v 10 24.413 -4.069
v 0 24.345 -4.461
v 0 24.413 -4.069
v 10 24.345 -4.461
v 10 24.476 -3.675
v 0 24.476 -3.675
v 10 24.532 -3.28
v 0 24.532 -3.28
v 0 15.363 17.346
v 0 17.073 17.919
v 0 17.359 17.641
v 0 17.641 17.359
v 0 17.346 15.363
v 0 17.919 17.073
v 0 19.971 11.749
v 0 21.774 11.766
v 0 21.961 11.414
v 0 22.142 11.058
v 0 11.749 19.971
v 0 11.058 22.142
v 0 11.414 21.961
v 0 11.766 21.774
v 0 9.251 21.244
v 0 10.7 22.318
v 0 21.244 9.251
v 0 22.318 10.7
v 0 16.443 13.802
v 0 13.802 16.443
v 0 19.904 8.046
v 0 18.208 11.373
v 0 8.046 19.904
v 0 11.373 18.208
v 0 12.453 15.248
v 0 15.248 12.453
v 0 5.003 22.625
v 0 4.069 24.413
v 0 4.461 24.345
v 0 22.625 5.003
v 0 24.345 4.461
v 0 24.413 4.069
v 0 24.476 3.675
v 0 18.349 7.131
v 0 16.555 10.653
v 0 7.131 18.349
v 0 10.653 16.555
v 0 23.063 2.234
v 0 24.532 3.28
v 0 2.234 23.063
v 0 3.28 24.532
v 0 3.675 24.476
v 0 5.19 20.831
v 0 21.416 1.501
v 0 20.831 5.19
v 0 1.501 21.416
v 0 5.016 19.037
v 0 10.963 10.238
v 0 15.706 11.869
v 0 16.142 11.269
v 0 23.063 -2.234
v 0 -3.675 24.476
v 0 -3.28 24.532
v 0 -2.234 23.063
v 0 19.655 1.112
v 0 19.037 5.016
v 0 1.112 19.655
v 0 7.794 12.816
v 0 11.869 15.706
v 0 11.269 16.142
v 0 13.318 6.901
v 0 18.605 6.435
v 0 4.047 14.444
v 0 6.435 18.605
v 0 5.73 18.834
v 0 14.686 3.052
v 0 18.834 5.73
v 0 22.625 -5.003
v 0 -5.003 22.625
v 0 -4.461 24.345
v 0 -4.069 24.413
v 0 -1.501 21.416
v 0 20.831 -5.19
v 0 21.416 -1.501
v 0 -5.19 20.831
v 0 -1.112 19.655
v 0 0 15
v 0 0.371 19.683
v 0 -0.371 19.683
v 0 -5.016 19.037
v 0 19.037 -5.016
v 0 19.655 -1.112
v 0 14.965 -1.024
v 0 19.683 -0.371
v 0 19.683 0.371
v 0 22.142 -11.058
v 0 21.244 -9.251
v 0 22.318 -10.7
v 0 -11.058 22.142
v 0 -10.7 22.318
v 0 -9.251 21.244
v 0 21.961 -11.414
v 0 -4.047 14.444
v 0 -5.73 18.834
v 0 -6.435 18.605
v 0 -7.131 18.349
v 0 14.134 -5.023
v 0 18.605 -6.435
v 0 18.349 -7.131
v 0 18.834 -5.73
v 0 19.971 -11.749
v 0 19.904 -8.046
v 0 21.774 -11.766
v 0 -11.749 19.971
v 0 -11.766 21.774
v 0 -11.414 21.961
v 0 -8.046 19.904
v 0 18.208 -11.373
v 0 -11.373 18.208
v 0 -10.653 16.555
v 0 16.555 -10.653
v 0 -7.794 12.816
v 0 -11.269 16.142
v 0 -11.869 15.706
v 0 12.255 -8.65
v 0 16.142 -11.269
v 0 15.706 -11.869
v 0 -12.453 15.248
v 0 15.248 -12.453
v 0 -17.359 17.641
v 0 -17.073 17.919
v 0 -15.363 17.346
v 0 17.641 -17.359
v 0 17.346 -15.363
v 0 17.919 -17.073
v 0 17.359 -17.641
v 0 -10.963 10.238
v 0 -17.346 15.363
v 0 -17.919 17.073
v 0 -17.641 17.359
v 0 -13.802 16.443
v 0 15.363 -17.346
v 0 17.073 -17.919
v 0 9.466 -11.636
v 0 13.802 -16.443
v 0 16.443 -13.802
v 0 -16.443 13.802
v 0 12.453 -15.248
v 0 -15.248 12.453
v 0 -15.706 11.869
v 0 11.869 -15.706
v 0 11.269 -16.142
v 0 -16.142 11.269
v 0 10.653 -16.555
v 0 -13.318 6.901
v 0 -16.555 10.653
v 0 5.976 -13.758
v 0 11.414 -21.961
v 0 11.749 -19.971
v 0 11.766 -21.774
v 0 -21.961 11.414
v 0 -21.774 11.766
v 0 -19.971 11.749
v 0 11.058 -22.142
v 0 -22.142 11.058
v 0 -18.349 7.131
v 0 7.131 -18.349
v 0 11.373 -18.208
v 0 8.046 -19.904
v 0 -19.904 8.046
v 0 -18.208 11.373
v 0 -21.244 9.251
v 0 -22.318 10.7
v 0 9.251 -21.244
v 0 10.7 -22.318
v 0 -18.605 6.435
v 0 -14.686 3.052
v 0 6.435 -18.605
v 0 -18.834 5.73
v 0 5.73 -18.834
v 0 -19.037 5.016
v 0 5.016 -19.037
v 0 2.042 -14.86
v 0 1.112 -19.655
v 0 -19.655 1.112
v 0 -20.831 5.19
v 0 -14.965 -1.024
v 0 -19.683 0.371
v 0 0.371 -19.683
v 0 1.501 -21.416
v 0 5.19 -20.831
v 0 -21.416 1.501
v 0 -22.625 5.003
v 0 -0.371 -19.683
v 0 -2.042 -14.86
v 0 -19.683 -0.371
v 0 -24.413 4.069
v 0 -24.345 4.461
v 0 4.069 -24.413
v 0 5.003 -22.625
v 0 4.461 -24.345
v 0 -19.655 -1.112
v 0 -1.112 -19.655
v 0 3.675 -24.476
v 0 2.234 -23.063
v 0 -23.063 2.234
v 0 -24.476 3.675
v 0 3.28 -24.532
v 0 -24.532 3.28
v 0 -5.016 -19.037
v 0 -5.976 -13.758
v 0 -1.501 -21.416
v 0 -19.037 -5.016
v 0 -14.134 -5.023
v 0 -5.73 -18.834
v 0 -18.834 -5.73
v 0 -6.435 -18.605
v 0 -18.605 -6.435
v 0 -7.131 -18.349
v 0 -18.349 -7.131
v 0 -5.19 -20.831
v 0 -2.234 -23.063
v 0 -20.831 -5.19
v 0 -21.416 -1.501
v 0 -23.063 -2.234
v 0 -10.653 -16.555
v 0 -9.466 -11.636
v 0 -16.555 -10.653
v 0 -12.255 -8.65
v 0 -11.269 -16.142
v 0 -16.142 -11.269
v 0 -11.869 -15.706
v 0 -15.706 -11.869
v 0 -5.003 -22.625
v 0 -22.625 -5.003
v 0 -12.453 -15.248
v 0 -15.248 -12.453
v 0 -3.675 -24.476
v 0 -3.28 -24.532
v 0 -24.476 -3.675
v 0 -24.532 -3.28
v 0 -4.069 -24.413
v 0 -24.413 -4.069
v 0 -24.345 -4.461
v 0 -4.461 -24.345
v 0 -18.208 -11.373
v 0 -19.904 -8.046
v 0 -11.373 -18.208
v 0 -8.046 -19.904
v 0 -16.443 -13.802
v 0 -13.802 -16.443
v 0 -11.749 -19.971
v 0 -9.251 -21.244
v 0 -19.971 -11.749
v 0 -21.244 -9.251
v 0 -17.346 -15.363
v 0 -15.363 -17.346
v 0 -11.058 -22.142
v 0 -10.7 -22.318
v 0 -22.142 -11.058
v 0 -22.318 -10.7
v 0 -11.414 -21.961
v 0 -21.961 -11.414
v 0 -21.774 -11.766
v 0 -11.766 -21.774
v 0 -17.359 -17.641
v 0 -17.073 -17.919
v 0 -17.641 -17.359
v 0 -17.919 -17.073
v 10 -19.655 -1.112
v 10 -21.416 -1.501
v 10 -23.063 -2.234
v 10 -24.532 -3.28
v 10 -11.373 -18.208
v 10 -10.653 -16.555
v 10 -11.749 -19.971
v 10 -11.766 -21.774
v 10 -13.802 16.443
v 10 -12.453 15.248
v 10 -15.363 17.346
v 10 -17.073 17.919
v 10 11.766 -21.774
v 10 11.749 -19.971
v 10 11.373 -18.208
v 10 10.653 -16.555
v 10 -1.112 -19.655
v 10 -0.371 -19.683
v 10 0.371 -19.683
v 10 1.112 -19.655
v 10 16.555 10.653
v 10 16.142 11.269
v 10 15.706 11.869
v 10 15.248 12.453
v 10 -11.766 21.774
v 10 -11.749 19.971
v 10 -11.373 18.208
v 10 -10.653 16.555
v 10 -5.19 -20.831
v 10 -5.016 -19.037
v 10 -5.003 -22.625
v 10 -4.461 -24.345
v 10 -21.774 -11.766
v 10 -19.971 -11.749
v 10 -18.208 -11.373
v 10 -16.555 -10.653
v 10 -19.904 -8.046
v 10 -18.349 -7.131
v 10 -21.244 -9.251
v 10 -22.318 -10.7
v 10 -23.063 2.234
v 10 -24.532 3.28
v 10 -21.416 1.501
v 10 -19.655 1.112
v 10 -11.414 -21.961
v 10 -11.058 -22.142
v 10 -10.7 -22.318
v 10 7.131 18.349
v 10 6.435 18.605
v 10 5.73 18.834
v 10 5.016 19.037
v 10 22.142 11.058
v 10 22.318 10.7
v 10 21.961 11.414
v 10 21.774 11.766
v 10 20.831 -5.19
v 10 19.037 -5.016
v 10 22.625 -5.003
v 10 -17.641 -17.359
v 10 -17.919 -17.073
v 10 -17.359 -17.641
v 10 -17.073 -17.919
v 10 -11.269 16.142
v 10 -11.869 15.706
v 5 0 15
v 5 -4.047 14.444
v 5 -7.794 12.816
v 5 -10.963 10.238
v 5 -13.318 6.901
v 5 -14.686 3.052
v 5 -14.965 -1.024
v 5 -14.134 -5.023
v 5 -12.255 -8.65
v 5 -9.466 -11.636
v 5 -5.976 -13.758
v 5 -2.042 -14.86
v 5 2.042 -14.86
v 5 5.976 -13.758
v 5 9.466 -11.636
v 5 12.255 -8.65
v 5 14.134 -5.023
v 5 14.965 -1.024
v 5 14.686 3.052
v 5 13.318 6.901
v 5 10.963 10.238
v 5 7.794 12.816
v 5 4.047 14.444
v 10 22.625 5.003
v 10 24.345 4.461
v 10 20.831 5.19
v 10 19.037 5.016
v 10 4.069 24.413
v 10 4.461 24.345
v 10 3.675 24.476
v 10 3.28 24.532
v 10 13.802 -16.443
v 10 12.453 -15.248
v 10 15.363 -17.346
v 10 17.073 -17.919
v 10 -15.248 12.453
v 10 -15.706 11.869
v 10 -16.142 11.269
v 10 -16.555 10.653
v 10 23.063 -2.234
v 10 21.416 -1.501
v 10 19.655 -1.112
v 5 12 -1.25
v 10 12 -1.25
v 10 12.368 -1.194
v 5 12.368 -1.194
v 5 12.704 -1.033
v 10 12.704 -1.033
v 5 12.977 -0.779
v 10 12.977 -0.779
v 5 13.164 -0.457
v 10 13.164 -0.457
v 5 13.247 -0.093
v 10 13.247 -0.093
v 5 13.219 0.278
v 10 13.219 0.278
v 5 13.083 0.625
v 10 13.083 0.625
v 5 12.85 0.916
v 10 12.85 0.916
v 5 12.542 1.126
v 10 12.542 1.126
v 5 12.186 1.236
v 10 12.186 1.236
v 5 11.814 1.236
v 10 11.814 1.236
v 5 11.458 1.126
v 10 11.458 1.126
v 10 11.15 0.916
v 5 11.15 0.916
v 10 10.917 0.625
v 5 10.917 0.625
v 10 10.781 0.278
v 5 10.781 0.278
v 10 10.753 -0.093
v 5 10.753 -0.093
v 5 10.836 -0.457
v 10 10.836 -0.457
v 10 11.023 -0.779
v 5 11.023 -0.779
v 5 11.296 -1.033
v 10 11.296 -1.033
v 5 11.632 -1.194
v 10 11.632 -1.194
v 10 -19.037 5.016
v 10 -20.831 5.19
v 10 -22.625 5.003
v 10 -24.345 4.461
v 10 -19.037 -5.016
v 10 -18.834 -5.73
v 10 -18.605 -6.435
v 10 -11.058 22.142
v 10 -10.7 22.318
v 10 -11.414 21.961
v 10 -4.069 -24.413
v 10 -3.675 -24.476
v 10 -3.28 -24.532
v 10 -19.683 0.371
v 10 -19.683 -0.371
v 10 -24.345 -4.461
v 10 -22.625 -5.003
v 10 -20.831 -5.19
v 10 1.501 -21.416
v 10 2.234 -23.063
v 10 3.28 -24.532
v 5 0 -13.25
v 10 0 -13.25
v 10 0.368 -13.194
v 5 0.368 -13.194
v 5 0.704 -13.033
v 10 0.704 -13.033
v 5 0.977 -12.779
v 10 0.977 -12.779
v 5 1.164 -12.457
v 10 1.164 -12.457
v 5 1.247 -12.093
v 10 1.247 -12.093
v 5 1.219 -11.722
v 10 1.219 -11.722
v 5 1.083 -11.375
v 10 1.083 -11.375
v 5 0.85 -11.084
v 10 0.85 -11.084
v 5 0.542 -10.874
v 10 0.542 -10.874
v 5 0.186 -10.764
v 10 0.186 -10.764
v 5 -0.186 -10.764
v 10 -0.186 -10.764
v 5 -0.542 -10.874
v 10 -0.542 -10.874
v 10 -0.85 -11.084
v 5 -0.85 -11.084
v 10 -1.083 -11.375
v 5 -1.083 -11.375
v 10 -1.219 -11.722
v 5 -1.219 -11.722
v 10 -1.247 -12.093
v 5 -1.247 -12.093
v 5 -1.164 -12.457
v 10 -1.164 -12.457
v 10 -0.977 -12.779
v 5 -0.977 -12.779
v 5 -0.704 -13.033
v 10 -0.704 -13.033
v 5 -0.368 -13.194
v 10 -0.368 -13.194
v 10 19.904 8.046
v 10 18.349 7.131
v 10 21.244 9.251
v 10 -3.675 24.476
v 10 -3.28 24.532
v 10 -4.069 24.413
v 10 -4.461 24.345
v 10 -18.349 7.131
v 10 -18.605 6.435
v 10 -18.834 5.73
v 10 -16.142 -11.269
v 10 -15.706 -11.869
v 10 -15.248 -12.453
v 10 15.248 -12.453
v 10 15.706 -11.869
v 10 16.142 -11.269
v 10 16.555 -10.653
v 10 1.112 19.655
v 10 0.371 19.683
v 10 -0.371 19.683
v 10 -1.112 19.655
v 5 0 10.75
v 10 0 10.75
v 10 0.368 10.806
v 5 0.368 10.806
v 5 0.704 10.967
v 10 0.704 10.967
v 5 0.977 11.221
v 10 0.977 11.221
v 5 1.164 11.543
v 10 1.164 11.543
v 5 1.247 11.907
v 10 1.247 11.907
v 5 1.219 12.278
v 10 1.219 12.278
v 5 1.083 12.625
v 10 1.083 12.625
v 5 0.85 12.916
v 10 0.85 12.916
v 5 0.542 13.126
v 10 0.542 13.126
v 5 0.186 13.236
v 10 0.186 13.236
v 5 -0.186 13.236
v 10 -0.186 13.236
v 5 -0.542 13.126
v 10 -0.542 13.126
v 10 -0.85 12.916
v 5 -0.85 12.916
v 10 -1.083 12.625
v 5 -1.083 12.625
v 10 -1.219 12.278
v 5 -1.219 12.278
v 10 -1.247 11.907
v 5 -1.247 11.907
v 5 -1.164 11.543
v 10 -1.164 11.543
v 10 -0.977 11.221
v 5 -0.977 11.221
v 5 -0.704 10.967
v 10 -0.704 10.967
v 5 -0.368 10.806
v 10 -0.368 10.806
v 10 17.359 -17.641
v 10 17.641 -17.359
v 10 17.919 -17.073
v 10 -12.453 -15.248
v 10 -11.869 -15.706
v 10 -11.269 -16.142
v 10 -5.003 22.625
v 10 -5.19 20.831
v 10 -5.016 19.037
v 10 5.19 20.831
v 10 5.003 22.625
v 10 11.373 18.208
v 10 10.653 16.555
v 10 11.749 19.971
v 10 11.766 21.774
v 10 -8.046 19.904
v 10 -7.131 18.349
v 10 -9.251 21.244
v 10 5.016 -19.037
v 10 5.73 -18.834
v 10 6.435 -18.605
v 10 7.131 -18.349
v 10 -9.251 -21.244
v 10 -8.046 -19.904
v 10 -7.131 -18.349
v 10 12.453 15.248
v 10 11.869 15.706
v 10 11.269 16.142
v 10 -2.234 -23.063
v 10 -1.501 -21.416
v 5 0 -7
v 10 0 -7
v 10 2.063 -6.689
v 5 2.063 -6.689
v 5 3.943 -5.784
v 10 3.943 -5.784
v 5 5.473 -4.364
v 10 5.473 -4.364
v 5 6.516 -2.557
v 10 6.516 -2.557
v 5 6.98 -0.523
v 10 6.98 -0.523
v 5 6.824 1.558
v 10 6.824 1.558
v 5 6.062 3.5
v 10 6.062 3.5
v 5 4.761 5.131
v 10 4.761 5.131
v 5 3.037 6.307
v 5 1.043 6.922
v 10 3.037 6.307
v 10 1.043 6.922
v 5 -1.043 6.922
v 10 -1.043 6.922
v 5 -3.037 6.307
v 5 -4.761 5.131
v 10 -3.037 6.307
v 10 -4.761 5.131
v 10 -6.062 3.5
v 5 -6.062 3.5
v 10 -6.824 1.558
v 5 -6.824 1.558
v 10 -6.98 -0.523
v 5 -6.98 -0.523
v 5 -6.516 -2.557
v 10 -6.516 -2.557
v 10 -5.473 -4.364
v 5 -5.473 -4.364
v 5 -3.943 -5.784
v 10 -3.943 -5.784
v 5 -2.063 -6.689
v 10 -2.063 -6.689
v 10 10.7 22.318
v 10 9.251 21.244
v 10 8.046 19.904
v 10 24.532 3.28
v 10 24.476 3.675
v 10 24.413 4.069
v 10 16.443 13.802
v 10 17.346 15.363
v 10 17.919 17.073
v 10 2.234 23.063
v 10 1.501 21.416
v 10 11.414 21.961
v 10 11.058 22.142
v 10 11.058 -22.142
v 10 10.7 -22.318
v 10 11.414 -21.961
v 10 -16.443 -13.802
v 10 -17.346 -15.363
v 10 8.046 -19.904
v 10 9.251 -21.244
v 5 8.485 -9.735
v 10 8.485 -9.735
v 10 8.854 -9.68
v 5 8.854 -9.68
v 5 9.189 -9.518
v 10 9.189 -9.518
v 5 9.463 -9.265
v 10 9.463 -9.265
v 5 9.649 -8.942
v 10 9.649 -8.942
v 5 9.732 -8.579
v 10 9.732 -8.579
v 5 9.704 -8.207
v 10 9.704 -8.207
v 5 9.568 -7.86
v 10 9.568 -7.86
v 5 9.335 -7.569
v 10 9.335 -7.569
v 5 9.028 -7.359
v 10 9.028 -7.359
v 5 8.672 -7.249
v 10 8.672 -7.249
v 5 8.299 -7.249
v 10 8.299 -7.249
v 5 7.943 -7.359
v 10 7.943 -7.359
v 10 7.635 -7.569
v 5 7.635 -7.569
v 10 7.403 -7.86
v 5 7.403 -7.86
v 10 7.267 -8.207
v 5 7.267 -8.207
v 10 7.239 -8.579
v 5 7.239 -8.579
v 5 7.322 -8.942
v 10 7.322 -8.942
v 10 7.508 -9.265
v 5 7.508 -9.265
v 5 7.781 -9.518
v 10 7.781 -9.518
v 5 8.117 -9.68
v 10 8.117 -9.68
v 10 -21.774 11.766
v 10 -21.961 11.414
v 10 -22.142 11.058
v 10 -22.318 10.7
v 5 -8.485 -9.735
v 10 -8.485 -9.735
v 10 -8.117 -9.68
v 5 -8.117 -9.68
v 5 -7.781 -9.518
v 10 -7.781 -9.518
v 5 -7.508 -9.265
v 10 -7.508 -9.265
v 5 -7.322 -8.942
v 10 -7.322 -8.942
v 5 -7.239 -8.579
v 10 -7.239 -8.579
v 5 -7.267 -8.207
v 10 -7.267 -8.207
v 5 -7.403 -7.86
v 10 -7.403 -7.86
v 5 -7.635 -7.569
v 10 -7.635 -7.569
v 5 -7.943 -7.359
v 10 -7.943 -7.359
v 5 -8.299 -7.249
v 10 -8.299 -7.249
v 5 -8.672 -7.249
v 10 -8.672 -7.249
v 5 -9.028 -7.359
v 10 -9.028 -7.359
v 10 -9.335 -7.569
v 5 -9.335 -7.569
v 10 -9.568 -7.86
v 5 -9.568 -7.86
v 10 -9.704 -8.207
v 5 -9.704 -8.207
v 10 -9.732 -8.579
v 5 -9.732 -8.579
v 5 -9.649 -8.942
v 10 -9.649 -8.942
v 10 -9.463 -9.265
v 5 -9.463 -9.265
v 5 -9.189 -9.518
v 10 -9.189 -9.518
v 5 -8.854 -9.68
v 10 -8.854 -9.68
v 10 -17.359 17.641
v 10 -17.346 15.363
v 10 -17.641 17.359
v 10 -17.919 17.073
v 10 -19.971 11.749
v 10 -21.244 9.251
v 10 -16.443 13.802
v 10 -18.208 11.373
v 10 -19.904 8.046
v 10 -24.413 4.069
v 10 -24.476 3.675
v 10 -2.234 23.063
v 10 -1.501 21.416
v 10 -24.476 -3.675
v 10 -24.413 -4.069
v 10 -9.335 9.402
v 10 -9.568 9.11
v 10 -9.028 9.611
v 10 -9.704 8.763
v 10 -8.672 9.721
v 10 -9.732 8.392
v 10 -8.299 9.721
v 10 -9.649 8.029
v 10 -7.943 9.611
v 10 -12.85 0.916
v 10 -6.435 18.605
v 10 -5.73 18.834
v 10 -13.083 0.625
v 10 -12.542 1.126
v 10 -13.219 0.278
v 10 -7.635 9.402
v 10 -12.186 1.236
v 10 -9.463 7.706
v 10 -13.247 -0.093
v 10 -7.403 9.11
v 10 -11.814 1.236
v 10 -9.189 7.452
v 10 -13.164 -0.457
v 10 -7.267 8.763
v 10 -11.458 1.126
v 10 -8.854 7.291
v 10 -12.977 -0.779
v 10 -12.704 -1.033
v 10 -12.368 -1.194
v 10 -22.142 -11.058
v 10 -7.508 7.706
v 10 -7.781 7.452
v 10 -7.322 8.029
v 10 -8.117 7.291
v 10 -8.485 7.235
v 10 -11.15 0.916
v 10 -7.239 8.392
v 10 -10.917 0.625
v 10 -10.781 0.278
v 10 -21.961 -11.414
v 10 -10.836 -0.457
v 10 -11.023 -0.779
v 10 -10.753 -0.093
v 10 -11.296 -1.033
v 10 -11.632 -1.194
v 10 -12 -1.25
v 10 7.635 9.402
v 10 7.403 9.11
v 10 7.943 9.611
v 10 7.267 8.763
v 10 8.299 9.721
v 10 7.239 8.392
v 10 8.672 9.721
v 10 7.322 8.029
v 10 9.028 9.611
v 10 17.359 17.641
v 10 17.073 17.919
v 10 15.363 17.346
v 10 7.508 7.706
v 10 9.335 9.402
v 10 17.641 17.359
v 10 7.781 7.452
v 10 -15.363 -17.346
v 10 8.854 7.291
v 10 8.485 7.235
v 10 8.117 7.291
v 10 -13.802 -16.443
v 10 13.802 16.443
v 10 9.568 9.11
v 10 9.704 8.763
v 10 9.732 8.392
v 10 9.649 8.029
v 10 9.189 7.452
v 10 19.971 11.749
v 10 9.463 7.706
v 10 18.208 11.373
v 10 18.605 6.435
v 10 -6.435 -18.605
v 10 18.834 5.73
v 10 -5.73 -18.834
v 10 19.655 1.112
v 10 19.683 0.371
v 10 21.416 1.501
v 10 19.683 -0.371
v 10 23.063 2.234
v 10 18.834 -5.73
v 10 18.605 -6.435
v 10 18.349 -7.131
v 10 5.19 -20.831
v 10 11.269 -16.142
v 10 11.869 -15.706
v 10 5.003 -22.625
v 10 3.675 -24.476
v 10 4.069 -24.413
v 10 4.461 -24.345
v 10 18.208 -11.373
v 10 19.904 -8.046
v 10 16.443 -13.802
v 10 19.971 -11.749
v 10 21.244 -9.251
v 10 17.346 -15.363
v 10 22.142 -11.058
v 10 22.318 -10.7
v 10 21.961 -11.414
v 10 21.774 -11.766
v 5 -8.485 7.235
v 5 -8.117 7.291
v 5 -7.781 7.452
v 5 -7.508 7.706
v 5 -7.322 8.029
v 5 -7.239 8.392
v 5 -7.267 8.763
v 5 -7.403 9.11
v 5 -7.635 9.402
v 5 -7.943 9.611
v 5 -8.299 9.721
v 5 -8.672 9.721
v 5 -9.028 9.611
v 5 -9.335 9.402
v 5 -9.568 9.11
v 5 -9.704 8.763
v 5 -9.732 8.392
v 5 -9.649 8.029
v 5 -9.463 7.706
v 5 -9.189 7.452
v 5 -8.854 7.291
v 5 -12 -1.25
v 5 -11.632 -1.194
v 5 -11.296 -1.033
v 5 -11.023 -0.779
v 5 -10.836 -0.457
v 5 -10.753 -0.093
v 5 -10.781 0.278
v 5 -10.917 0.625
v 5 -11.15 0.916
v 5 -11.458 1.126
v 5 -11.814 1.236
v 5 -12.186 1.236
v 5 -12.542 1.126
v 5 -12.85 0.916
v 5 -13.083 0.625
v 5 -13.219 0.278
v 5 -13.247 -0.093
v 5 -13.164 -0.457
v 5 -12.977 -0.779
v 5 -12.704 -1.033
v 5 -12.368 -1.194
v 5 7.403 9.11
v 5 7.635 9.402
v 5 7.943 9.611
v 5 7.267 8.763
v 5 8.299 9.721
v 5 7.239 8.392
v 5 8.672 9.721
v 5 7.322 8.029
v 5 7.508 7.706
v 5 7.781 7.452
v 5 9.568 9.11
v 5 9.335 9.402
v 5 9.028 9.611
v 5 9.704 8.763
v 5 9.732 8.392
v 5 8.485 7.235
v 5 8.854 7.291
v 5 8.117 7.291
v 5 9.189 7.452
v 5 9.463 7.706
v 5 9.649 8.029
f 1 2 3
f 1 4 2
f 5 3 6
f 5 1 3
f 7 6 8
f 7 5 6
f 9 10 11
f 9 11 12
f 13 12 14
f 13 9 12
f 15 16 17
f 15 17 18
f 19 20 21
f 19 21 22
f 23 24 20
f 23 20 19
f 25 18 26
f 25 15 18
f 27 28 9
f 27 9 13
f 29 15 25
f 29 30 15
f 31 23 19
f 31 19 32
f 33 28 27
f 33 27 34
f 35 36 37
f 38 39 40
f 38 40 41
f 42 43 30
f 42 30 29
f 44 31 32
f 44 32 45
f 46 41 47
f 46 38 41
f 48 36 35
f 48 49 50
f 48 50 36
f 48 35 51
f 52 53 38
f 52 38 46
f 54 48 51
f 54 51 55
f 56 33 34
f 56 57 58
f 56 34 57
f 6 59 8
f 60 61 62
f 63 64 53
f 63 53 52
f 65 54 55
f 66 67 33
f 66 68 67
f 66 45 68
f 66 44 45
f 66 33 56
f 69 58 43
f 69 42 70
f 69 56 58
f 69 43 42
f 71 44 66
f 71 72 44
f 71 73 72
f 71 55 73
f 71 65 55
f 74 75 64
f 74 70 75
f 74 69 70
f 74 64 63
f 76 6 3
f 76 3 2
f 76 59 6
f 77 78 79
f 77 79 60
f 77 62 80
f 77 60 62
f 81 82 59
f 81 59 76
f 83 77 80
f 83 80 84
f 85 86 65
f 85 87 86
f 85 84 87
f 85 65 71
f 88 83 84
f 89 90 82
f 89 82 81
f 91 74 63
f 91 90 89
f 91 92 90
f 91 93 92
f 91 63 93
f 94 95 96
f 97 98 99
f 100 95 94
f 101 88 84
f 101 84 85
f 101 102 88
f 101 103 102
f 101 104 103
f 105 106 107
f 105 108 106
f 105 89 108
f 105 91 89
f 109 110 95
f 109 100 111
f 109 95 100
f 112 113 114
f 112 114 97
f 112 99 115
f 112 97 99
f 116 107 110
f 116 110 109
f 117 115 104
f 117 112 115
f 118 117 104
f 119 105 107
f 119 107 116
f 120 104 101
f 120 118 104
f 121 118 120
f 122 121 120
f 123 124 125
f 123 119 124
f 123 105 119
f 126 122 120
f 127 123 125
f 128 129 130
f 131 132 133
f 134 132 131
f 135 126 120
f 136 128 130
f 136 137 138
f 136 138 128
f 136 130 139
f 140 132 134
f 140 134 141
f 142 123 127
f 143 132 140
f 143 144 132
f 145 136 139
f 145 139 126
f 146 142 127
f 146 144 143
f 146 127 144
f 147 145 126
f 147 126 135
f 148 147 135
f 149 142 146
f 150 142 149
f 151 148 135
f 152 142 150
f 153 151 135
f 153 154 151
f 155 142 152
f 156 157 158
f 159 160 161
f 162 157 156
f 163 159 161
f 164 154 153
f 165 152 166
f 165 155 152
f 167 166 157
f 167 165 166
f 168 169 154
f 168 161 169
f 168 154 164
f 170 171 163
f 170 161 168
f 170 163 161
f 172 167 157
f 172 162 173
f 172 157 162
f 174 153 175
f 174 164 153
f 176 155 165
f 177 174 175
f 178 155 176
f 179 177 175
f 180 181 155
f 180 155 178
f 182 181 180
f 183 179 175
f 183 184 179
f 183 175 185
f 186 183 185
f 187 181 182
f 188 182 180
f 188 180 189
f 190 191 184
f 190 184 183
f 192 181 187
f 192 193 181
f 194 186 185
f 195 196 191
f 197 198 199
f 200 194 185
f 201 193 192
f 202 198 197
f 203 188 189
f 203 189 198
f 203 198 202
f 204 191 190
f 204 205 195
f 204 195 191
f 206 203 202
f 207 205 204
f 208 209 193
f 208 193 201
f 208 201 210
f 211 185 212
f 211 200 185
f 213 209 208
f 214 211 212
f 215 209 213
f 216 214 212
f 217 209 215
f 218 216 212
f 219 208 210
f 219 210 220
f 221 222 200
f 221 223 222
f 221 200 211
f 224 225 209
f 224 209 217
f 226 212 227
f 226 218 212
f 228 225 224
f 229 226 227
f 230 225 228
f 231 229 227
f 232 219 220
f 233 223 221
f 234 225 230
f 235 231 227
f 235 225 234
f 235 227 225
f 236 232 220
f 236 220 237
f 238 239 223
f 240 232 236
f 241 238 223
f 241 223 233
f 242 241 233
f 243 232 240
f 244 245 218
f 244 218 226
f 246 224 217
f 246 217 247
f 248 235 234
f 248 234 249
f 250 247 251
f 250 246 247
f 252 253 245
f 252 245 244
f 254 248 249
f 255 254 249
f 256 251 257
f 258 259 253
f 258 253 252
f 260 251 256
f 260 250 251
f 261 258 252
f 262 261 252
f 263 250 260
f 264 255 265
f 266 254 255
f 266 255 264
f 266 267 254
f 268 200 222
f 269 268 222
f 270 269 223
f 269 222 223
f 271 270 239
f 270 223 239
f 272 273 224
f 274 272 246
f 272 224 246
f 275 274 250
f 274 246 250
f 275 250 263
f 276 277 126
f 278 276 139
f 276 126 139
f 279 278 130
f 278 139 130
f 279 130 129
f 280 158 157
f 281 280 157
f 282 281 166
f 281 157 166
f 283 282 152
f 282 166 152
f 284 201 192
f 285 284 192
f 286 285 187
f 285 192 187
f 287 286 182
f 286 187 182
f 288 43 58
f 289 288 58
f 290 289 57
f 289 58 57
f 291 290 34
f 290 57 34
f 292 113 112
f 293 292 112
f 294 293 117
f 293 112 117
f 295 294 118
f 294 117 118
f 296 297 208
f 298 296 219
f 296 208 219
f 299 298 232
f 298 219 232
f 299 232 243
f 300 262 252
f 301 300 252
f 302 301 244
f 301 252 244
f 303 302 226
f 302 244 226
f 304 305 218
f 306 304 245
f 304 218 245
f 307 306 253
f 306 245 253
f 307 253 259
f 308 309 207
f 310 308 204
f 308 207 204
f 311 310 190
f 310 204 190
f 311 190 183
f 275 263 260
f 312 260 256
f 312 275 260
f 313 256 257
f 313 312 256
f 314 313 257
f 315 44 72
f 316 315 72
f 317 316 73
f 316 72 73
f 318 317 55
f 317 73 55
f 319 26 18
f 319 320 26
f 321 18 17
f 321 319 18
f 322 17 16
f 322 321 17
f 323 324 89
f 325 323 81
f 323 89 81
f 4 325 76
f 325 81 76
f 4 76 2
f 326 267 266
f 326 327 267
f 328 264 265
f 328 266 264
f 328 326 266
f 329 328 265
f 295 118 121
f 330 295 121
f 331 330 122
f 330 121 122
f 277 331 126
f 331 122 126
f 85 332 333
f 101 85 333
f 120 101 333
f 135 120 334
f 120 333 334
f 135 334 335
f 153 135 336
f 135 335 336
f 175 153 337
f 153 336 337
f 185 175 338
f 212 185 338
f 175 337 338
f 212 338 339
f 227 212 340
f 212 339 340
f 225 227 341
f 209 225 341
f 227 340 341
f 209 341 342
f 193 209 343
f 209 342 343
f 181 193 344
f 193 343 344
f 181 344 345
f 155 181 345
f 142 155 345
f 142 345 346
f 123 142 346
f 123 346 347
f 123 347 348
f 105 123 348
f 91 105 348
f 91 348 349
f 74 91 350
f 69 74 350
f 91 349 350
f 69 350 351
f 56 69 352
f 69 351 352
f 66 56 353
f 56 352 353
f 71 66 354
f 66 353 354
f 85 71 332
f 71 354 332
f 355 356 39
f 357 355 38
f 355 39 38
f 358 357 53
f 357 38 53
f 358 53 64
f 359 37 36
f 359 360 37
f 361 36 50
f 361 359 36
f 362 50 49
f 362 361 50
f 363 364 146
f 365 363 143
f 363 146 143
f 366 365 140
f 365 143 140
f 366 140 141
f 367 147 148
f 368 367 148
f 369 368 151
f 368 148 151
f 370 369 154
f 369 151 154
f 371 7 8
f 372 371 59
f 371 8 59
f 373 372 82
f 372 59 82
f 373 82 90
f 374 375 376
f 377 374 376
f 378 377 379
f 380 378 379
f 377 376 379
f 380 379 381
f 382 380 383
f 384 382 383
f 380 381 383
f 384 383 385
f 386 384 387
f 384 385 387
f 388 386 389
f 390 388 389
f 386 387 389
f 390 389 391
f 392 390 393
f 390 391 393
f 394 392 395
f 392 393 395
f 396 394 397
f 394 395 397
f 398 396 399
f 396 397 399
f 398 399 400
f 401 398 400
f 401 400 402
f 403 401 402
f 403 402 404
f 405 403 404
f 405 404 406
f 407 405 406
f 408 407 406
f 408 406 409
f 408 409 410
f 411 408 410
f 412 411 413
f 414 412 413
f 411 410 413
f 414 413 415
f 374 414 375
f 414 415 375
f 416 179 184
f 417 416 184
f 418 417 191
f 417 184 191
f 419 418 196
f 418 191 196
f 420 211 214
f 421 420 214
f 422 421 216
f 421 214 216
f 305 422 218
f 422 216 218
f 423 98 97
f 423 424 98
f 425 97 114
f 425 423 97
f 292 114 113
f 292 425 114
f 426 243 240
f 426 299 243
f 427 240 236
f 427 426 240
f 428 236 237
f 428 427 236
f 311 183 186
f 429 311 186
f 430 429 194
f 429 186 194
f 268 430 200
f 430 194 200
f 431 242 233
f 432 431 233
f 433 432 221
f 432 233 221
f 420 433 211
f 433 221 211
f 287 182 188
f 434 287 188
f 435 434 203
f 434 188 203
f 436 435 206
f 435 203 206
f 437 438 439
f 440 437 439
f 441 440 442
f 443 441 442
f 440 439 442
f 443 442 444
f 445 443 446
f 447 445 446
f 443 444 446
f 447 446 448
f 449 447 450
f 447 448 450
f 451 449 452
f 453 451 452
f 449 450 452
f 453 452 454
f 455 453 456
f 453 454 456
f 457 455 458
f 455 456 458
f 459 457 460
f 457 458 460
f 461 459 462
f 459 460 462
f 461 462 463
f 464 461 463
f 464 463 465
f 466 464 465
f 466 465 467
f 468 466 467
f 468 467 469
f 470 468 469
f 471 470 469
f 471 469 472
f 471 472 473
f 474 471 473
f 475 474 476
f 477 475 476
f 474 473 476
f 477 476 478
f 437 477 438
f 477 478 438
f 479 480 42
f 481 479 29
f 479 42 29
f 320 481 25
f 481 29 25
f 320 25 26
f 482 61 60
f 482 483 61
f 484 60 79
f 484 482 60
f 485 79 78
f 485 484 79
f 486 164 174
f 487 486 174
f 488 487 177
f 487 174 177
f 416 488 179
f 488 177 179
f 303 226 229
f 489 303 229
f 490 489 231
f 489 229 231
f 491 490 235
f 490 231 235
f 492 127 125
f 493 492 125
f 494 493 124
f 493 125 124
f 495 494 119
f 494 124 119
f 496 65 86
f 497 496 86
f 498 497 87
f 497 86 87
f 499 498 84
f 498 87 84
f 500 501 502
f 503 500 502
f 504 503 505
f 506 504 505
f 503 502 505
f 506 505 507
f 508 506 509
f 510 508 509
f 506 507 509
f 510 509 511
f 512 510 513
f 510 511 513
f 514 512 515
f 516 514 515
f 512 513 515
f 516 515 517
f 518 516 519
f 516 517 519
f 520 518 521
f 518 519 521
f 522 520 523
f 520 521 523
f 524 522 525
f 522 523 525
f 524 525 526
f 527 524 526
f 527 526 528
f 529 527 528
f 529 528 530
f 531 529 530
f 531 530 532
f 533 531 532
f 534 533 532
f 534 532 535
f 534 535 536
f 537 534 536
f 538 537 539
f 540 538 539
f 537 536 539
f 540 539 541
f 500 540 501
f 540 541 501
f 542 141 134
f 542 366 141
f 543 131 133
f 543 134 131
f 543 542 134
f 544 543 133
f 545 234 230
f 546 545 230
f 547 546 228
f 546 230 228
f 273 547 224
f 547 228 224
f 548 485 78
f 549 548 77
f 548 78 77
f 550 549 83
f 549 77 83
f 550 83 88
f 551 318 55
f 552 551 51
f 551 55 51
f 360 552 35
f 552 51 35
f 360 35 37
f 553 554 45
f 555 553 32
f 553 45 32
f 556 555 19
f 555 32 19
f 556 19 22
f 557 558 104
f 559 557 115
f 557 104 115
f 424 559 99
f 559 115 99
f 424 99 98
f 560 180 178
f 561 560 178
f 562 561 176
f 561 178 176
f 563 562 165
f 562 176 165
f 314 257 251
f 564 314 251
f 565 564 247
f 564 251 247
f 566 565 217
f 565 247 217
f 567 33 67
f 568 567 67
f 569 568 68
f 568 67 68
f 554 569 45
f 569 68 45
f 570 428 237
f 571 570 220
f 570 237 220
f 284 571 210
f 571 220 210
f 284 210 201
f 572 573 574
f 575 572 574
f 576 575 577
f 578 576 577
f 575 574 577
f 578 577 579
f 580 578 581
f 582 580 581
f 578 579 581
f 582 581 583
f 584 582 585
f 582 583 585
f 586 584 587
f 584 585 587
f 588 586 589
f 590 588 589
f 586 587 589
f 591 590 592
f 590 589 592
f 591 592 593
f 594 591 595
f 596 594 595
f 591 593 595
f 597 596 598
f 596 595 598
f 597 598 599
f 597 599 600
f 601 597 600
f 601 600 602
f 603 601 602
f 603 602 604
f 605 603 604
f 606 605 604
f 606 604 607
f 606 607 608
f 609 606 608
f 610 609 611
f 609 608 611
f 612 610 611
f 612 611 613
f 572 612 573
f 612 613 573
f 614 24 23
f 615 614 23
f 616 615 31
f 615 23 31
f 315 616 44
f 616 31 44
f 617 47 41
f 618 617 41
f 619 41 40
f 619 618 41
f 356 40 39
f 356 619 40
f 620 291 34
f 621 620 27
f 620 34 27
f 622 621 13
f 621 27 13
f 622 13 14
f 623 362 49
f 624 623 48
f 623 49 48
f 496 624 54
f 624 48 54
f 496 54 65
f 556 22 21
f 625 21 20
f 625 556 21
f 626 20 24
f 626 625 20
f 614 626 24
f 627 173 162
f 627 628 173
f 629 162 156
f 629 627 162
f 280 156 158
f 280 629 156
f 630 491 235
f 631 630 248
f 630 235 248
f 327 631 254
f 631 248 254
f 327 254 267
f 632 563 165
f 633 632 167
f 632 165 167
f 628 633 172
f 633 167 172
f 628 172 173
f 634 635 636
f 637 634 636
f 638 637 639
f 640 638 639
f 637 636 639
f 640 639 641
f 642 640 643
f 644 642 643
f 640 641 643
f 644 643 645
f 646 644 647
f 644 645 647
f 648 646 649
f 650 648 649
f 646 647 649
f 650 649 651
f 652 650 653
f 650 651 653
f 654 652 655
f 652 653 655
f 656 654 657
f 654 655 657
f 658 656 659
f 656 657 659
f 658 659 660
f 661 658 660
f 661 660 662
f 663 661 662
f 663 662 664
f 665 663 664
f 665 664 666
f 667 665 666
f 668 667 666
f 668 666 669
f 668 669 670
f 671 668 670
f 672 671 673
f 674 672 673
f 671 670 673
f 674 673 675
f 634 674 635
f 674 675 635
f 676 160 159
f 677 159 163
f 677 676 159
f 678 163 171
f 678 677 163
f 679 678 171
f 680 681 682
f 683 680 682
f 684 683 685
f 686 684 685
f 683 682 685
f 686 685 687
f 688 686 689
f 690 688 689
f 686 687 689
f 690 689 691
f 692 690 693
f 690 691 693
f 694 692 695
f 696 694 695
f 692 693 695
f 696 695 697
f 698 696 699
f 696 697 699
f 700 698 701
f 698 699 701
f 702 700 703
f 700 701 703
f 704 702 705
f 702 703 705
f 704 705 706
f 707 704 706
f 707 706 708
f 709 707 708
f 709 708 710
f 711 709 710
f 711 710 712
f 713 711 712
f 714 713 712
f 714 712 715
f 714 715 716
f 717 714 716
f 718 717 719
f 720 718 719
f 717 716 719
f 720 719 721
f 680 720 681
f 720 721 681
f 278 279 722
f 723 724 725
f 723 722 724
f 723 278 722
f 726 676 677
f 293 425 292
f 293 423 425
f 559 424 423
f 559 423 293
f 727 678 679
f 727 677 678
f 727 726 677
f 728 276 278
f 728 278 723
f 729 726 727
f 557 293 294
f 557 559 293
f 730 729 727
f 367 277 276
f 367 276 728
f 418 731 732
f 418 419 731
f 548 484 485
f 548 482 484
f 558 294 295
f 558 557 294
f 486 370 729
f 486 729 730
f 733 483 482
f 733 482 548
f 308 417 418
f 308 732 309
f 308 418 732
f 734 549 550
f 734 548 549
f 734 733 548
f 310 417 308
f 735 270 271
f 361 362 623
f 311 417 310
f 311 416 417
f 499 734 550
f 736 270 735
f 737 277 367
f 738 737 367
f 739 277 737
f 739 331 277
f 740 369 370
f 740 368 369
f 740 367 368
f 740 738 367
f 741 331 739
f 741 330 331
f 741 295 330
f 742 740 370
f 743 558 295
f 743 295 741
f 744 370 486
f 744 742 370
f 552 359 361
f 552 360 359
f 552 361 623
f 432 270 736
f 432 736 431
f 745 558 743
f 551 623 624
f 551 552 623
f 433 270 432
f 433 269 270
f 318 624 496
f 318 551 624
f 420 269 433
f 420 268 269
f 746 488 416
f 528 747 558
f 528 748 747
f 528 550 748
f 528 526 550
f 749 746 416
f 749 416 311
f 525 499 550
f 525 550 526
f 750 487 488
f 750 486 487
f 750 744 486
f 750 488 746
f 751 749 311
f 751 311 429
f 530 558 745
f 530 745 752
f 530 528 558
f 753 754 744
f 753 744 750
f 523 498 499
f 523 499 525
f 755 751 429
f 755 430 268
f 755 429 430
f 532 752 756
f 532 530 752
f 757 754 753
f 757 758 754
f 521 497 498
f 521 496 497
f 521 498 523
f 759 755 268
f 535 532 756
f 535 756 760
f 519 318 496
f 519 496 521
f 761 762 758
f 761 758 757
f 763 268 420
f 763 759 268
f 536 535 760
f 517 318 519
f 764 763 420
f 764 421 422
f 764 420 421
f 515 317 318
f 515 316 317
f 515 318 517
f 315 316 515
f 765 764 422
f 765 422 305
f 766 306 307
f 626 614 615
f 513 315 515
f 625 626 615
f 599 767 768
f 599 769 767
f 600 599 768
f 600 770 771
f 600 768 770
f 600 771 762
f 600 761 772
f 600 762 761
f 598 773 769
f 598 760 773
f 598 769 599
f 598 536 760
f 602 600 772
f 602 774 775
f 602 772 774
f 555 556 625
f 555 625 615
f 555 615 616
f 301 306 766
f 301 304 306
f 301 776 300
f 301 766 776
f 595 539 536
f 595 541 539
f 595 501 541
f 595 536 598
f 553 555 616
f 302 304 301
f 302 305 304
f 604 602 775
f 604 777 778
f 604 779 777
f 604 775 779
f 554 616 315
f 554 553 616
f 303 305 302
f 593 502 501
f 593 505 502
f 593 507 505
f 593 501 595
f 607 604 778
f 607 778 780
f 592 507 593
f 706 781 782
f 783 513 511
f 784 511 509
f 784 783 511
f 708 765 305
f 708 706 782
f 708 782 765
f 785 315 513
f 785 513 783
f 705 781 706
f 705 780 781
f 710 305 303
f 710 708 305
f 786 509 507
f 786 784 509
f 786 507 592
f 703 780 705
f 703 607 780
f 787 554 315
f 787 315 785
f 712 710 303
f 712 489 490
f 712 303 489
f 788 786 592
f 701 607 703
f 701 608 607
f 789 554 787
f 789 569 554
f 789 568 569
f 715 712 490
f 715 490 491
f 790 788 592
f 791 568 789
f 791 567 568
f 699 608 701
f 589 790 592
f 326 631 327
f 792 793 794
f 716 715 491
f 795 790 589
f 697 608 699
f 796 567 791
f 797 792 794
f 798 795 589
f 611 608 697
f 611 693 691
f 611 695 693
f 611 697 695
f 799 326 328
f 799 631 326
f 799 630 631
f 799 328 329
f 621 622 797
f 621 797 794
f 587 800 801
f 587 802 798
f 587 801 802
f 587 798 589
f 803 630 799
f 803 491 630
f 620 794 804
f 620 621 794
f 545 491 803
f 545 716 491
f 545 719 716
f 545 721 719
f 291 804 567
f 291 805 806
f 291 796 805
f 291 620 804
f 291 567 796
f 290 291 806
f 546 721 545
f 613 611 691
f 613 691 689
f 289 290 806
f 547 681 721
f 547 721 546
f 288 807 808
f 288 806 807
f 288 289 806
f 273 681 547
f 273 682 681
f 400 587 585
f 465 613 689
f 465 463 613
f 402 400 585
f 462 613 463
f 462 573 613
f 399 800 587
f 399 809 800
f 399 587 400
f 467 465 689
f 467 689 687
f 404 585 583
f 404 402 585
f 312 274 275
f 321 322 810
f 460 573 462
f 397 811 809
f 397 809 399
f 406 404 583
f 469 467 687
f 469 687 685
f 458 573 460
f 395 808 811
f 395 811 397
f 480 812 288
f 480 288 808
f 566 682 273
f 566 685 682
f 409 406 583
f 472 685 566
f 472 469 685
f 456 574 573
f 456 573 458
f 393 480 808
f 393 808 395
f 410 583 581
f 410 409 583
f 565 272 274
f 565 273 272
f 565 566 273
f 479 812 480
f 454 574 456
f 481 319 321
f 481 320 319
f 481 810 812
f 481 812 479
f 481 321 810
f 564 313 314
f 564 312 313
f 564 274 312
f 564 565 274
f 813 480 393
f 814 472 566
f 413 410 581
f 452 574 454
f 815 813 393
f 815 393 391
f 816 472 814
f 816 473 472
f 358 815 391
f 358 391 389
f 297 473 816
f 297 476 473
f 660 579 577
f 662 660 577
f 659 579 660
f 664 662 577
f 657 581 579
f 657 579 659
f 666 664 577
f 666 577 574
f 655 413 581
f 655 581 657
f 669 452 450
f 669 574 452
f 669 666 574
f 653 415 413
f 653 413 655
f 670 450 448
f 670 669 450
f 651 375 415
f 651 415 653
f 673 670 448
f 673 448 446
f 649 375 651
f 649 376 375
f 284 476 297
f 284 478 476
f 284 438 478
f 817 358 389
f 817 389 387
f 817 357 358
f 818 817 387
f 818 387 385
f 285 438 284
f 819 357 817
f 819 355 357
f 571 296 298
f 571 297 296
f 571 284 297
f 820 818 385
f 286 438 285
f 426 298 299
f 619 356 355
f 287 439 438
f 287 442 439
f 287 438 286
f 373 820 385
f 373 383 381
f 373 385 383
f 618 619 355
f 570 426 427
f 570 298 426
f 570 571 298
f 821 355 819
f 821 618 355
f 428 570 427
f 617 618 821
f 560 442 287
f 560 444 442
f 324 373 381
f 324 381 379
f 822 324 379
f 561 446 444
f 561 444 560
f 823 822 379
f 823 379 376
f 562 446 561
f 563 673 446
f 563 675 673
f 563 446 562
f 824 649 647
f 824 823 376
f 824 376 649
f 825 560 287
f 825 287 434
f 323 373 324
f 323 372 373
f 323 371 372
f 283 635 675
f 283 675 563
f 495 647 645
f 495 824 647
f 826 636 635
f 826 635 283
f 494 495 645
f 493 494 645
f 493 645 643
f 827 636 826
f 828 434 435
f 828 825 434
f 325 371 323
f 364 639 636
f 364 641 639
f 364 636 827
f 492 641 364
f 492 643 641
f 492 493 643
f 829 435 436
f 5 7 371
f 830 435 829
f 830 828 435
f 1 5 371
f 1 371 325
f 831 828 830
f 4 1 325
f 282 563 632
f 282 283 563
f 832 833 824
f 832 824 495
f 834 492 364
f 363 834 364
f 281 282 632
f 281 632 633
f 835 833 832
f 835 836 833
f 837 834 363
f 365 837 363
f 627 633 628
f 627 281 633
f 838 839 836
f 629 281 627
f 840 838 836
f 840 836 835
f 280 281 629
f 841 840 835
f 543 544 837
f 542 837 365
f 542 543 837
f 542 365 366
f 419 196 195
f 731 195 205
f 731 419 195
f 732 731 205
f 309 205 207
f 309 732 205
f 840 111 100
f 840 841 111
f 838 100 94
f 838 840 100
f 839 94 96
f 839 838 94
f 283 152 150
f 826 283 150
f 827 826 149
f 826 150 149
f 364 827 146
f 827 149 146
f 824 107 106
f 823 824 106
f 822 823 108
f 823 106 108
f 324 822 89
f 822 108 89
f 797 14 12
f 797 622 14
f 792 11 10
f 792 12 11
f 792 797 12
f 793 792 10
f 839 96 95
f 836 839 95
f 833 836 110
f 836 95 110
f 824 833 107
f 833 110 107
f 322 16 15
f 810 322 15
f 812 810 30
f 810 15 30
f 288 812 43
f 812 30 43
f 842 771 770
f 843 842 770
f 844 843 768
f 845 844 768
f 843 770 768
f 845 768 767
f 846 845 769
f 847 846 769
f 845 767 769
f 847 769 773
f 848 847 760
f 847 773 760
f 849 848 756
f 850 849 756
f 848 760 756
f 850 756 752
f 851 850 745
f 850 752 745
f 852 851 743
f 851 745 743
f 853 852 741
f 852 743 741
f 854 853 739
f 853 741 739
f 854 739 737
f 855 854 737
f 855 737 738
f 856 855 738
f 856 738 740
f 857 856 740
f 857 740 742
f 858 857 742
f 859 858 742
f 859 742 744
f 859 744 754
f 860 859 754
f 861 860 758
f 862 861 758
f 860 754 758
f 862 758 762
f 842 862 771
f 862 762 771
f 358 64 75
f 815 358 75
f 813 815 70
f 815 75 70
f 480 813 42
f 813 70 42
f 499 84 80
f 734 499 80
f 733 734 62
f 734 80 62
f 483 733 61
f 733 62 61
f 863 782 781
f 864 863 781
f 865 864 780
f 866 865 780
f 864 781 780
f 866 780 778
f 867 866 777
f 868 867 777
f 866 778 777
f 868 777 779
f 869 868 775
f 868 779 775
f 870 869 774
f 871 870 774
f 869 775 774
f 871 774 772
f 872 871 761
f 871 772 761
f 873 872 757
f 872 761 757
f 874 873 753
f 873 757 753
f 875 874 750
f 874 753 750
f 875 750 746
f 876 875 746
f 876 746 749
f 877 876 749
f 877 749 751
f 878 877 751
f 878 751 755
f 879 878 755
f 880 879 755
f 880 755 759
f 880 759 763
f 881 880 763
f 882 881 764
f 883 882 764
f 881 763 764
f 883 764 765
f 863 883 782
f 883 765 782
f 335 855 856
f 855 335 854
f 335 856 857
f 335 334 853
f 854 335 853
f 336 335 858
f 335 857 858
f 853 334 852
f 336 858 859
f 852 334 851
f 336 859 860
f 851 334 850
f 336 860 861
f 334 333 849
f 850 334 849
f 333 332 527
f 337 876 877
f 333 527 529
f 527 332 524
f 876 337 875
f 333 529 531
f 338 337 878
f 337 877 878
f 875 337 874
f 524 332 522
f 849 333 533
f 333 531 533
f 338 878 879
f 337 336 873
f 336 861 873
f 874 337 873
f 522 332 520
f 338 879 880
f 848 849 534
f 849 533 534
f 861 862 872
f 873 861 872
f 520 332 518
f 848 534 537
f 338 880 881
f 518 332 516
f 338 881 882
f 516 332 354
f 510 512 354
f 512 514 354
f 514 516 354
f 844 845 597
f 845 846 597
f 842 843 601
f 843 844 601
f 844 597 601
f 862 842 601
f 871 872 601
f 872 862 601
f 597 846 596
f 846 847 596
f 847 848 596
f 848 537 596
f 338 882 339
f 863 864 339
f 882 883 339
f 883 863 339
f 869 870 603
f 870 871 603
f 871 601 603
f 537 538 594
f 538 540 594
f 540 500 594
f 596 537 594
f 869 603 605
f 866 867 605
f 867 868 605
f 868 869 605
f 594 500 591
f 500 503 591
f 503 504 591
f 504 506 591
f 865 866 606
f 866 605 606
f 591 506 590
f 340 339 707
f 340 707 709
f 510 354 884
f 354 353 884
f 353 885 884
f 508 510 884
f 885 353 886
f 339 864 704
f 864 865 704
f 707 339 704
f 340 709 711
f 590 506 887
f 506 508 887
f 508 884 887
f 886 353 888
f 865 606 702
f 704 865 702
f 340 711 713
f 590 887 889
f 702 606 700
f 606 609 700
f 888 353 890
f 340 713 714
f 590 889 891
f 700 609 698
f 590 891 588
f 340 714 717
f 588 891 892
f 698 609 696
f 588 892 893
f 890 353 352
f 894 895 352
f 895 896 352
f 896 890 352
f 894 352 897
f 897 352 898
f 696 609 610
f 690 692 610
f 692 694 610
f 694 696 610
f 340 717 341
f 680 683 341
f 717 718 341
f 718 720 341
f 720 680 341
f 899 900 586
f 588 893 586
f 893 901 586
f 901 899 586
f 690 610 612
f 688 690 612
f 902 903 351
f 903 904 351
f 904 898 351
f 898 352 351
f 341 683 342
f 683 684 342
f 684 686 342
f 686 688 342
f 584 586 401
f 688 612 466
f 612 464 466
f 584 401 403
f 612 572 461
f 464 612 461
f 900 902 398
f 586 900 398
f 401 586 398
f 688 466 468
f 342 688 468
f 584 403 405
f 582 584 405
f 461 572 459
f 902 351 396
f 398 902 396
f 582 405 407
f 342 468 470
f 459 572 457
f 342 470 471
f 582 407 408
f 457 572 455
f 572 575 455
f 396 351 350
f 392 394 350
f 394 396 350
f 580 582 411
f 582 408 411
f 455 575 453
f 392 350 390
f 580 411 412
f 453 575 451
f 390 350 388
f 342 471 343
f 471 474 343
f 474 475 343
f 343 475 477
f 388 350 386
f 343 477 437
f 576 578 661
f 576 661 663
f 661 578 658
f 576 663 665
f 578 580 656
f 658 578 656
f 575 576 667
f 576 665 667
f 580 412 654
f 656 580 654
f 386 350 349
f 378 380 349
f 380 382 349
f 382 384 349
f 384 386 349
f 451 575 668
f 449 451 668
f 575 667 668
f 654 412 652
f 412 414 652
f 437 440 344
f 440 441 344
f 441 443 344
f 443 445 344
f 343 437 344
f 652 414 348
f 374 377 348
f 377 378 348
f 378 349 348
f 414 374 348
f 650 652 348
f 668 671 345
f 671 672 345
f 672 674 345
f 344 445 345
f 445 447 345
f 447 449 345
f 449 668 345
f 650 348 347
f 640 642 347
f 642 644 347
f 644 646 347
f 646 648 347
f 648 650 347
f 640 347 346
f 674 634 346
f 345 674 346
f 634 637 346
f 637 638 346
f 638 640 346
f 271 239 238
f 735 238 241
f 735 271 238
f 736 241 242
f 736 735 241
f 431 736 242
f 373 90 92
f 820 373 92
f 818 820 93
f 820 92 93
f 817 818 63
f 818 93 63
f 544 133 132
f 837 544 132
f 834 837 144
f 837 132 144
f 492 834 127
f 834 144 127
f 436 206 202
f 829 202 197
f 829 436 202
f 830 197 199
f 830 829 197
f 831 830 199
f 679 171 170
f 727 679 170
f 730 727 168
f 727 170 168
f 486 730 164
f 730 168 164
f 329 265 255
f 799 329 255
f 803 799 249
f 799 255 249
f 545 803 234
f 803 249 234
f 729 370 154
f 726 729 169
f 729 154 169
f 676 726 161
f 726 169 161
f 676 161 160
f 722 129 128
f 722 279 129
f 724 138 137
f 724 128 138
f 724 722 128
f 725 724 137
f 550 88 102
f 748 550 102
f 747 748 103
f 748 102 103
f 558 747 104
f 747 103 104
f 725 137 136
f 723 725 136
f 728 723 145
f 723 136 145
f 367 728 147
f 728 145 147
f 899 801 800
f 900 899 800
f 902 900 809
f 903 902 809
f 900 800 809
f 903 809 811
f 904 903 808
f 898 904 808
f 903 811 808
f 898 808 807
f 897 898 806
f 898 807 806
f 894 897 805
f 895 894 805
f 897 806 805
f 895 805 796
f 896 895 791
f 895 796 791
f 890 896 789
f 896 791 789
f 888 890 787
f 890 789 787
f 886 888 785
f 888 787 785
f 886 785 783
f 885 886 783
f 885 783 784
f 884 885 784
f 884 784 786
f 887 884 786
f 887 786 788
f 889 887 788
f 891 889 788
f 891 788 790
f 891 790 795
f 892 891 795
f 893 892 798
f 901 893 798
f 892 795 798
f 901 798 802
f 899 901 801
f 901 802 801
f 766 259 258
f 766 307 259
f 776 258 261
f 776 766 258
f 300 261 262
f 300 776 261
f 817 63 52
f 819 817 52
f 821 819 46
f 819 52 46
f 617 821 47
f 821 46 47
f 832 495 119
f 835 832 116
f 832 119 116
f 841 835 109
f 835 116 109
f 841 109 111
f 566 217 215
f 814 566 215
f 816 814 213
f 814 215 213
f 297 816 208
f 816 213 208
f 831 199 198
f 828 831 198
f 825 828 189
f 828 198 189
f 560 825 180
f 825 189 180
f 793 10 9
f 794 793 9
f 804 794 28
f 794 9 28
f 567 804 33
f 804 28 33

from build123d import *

# Parameters (mm, degrees)
BASPROSKE_W         = 10
BASPROSKE_H         = 24.75
TOOTHCUT_DEPTH      = 37.402266413
TEETHCUTS_COUNT     = 20
TEETHCUTS_ANGLE     = 342
BORSKE_R            = 15
BORE_DEPTH          = 50.0000508
SKETCH1_R           = 15
BOSS_EXTRUDE1_DEPTH = 5
SKETCH2_R           = 7
CUT_EXTRUDE1_DEPTH  = 5
SKETCH3_R           = 1.25
CUT_EXTRUDE2_DEPTH  = 5


with BuildPart() as part:
    # BasProSke → Base-Revolve (revolve)
    with BuildSketch(Plane(origin=(0, 0, 0), x_dir=(1, 0, 0), z_dir=(0, 1, 0)), mode=Mode.PRIVATE) as base_revolve_sk:
        with Locations((5, 12.375)):
            Rectangle(BASPROSKE_W, BASPROSKE_H)
    revolve(base_revolve_sk.sketch.rotate(Axis((-10, 0, 0), (1, 0, 0)), 180), axis=Axis((-10, 0, 0), (1, 0, 0)))

    # TooCutSke → ToothCut (cut, through all)
    with BuildSketch(Plane(origin=(0, 0, 0), x_dir=(0, 0, -1), z_dir=(1, 0, 0))):
        with BuildLine():
            ThreePointArc((1.111948432, 19.655071939), (0, 19.6865), (-1.111948432, 19.655071939))
            ThreePointArc((-1.111948432, 19.655071939), (-1.832349961, 22.271720111), (-3.300041734, 24.55463642))
            ThreePointArc((-3.300041734, 24.55463642), (0, 24.7754), (3.300041734, 24.55463642))
            ThreePointArc((3.300041734, 24.55463642), (1.832349961, 22.271720111), (1.111948432, 19.655071939))
        make_face()
    toothcut = extrude(amount=TOOTHCUT_DEPTH, mode=Mode.SUBTRACT)

    # TeethCuts: ToothCut ×20 about axis
    teethcuts_axis = Axis((-10, 0, 0), (1, 0, 0))
    for i in range(1, TEETHCUTS_COUNT):
        add(toothcut.rotate(teethcuts_axis, i * TEETHCUTS_ANGLE / (TEETHCUTS_COUNT - 1)), mode=Mode.SUBTRACT)

    # BorSke → Bore (cut, symmetric)
    with BuildSketch(Plane(origin=(0, 0, 0), x_dir=(0, 0, -1), z_dir=(1, 0, 0))):
        with Locations(Location((0, 0, 0), (0, 0, 180))):
            Circle(BORSKE_R)
    extrude(amount=BORE_DEPTH, both=True, mode=Mode.SUBTRACT)

    # Sketch1 → Boss-Extrude1 (add)
    with BuildSketch(Plane(origin=(10, 0, 0), x_dir=(0, 0, -1), z_dir=(1, 0, 0))):
        Circle(SKETCH1_R)
    extrude(amount=-BOSS_EXTRUDE1_DEPTH)

    # Sketch2 → Cut-Extrude1 (cut)
    with BuildSketch(Plane(origin=(10, 0, 0), x_dir=(0, 0, -1), z_dir=(1, 0, 0))):
        Circle(SKETCH2_R)
    extrude(amount=-CUT_EXTRUDE1_DEPTH, mode=Mode.SUBTRACT)

    # Sketch3 → Cut-Extrude2 (cut)
    with BuildSketch(Plane(origin=(10, 0, 0), x_dir=(0, 0, -1), z_dir=(1, 0, 0))):
        with Locations((0, 12)):
            Circle(SKETCH3_R)
        with Locations((8.485281374, 8.485281374)):
            Circle(SKETCH3_R)
        with Locations((12, 0)):
            Circle(SKETCH3_R)
        with Locations((8.485281374, -8.485281374)):
            Circle(SKETCH3_R)
        with Locations((0, -12)):
            Circle(SKETCH3_R)
        with Locations((-8.485281374, -8.485281374)):
            Circle(SKETCH3_R)
        with Locations((-12, 0)):
            Circle(SKETCH3_R)
        with Locations((-8.485281374, 8.485281374)):
            Circle(SKETCH3_R)
    extrude(amount=-CUT_EXTRUDE2_DEPTH, mode=Mode.SUBTRACT)


solid = part.part
